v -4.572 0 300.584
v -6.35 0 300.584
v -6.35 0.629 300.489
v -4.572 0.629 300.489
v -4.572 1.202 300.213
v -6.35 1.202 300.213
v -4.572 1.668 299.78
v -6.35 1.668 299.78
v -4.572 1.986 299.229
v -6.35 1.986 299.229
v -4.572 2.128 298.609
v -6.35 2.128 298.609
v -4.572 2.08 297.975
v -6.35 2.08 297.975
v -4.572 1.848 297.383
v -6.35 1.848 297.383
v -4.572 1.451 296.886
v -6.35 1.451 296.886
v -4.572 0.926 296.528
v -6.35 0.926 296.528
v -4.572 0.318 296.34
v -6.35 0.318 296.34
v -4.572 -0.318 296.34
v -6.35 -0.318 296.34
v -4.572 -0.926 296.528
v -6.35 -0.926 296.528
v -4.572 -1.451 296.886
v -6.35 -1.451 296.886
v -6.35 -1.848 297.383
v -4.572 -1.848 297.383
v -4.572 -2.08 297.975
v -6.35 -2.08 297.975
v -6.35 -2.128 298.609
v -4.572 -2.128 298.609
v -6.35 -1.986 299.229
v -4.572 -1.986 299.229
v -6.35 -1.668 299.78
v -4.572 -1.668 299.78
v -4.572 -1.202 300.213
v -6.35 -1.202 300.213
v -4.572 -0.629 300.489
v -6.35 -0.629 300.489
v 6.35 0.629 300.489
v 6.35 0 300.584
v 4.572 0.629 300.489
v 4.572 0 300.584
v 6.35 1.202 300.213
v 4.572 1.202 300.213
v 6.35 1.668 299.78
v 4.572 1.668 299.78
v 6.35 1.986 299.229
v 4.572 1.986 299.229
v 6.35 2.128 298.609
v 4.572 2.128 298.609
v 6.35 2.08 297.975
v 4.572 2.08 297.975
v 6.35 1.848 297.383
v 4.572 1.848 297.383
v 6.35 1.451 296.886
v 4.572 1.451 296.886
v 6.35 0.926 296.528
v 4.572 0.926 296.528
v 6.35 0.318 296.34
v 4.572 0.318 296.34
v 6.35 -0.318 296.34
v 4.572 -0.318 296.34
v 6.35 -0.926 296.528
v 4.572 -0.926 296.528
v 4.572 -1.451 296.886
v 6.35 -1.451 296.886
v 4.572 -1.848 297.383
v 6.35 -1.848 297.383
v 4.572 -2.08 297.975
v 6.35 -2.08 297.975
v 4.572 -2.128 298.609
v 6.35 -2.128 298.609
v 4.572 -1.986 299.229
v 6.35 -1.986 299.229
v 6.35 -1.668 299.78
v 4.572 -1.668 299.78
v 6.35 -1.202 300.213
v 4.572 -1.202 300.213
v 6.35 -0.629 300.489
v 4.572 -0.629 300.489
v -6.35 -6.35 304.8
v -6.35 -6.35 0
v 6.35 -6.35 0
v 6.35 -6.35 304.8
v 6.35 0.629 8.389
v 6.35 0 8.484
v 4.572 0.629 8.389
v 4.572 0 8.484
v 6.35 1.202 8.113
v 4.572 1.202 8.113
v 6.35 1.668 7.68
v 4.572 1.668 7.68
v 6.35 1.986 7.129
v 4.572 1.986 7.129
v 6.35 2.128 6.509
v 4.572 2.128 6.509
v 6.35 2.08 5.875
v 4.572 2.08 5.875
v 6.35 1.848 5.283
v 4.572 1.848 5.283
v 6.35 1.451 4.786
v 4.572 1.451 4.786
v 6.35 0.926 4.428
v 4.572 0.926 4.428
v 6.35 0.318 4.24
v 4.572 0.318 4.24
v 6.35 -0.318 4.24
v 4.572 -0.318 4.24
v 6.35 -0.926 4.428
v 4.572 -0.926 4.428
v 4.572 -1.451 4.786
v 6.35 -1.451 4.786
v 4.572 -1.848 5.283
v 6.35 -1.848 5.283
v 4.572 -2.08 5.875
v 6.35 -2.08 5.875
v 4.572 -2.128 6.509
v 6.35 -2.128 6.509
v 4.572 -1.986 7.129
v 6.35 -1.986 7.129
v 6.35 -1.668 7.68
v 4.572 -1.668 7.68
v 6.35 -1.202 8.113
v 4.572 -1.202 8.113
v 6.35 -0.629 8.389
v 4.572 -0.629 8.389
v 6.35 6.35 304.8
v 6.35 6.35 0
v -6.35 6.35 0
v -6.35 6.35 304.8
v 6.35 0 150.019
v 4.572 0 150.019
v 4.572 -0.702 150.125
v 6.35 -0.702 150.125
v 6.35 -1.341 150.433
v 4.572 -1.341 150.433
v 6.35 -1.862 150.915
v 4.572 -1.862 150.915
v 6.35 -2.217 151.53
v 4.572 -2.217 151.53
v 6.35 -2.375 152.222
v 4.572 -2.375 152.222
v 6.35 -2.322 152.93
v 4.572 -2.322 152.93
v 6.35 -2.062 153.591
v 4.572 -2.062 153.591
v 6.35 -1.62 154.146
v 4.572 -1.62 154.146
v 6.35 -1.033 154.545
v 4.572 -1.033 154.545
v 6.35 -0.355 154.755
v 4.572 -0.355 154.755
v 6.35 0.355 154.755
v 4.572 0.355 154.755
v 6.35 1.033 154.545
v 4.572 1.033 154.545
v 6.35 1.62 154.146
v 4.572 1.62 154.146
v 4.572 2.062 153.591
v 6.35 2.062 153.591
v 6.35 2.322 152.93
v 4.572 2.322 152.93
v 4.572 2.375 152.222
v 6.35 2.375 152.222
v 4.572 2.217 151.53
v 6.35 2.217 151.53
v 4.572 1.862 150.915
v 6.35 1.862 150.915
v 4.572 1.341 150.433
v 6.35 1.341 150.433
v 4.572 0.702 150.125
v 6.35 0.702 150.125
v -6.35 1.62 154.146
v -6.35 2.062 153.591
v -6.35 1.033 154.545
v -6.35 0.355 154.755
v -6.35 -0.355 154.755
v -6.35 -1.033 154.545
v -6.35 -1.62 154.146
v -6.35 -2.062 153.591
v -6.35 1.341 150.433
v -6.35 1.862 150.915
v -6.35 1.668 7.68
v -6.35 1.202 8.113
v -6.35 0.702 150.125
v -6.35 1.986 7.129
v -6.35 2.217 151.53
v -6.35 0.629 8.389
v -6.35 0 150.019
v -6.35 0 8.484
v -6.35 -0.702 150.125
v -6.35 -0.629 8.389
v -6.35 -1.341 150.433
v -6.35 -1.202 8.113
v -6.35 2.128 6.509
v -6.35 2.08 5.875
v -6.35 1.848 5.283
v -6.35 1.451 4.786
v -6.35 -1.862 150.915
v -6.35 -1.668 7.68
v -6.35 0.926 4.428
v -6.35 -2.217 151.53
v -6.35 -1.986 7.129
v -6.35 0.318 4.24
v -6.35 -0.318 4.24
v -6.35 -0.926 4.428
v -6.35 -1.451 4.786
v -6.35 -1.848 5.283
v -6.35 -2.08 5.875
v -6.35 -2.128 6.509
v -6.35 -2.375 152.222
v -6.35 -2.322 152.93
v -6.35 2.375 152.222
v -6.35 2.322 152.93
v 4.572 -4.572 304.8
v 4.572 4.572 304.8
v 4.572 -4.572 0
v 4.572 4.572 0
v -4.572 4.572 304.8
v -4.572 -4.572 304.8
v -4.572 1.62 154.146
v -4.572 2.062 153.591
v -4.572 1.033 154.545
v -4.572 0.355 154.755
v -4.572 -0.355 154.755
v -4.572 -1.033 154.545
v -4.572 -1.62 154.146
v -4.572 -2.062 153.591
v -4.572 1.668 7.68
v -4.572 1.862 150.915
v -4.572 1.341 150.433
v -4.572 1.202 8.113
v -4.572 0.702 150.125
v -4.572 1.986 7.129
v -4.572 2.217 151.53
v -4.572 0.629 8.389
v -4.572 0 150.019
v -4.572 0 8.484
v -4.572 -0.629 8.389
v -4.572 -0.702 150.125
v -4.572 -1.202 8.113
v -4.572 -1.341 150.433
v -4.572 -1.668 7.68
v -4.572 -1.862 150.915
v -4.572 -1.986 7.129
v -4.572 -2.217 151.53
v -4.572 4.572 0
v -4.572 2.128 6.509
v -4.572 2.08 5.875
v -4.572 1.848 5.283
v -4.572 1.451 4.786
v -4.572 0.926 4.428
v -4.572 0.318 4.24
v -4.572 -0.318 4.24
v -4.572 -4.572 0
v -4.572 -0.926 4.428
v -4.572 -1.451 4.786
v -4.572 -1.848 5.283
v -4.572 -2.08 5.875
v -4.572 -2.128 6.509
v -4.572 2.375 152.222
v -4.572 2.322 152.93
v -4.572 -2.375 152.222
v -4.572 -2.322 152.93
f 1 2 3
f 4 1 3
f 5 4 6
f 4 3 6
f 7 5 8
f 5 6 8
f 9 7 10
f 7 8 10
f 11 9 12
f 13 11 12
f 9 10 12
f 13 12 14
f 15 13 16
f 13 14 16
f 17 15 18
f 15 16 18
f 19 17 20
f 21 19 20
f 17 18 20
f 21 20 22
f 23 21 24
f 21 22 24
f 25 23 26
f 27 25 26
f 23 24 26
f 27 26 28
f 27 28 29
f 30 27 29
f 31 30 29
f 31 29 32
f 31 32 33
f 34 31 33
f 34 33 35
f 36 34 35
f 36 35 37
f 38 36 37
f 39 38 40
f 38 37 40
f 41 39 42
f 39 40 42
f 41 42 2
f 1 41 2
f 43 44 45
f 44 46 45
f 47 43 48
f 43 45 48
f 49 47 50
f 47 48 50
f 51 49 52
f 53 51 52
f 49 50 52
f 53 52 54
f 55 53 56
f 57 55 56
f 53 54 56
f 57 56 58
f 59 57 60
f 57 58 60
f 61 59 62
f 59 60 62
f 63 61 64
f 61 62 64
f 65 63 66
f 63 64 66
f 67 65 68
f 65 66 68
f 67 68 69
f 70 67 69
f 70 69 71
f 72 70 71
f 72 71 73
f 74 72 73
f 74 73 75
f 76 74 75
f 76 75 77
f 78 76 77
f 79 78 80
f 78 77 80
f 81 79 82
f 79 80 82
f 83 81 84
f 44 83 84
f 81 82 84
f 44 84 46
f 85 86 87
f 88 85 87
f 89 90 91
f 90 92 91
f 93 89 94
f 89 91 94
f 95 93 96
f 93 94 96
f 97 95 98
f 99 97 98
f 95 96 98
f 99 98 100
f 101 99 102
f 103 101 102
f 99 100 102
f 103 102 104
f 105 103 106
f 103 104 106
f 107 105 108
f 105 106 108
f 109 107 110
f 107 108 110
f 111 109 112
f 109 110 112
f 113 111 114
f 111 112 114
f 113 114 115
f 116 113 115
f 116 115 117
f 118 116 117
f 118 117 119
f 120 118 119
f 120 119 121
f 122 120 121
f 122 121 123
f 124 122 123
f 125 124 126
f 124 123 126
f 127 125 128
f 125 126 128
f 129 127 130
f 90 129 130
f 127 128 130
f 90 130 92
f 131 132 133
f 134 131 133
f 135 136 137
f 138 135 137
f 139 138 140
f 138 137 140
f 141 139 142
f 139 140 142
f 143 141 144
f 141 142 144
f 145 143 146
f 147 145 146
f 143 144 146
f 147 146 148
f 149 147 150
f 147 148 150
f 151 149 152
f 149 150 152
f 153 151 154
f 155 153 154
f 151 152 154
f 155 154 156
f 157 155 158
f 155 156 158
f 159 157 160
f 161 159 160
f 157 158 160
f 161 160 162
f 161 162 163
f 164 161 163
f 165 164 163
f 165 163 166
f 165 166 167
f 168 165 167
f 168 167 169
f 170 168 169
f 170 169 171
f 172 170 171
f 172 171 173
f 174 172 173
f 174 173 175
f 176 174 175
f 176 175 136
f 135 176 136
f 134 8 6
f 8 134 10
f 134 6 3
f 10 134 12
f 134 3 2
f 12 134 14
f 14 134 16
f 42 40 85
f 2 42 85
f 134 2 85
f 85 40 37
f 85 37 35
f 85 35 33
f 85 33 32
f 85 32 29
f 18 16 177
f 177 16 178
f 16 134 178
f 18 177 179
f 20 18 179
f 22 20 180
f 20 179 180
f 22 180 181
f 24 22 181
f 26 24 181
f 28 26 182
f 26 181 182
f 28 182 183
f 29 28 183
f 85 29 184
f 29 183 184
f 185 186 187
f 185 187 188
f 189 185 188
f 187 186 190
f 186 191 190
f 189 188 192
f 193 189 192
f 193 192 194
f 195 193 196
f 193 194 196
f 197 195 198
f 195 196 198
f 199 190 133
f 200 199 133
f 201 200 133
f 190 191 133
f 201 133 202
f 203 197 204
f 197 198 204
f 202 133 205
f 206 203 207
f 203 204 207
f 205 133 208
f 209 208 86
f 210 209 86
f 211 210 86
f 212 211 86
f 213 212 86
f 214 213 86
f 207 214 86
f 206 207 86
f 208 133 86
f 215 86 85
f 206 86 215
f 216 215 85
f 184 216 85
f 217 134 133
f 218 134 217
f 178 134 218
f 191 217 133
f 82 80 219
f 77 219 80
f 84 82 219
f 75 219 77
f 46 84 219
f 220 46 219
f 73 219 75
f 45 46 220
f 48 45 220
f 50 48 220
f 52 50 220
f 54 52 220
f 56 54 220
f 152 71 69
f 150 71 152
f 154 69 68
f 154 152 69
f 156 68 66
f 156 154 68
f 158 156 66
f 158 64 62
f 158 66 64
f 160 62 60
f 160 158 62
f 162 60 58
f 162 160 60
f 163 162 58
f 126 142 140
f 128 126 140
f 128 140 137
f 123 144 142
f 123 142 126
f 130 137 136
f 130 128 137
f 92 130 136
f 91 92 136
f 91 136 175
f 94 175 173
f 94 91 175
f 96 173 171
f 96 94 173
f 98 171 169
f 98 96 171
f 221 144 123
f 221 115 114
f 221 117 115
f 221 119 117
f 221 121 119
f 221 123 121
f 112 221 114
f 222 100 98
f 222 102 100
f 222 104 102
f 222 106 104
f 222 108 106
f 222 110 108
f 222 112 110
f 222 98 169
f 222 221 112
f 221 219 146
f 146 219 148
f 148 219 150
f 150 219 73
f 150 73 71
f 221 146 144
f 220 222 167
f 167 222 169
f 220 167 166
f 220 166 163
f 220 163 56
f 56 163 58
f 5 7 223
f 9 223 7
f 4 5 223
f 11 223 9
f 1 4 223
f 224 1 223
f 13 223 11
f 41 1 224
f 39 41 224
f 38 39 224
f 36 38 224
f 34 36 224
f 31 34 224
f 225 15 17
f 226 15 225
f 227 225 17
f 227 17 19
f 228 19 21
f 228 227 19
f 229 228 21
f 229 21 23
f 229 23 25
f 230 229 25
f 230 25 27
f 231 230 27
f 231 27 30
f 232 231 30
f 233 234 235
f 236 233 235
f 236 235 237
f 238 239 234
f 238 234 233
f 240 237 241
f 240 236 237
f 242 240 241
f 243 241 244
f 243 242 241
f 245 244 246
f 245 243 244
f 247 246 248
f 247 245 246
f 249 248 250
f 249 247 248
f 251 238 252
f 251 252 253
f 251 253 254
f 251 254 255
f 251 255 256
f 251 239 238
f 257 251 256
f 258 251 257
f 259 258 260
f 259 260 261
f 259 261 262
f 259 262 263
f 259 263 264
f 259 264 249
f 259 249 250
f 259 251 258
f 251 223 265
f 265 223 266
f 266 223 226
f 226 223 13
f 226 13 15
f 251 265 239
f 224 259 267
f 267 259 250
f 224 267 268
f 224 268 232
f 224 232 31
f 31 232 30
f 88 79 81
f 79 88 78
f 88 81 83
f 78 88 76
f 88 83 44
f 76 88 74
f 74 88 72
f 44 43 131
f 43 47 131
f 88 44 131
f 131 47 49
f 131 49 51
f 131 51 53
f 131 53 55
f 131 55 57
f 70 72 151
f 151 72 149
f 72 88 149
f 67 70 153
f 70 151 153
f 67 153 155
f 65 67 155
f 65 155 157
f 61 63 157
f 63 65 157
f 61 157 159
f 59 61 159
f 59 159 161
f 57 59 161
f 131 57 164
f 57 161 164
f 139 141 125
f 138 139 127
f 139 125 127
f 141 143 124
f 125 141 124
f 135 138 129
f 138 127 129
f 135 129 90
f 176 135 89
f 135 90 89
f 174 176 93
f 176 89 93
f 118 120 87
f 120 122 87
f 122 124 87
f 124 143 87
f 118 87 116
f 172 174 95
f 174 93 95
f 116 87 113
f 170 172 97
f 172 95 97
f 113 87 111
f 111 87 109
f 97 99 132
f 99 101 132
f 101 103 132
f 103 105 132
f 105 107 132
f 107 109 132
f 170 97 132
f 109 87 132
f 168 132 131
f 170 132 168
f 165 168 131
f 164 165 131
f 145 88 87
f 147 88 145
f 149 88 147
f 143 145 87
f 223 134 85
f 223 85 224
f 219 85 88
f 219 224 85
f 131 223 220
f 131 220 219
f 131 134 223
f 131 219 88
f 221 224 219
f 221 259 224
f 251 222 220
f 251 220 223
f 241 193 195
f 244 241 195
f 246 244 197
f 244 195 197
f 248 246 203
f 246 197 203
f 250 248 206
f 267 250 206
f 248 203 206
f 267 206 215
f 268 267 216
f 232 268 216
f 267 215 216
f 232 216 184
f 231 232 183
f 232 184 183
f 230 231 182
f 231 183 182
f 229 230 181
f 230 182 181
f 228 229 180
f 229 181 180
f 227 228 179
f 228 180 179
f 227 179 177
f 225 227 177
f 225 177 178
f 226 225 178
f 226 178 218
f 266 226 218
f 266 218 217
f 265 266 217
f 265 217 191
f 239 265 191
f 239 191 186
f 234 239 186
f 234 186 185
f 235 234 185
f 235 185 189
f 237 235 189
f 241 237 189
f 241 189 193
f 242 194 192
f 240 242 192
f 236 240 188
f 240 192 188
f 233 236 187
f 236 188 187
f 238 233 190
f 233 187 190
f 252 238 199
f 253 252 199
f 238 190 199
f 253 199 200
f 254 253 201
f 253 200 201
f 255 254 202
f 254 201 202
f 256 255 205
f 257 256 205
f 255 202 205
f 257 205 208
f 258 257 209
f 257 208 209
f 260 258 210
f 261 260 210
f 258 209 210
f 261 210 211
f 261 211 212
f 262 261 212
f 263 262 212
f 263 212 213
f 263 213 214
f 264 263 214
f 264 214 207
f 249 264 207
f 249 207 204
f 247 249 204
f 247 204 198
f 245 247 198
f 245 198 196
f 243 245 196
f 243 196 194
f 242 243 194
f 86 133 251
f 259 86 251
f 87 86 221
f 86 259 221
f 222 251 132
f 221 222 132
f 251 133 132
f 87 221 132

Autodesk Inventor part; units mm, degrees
ref_plane "YZ Plane" through (0, 0, 0) normal (1, 0, 0) x (0, 1, 0)
ref_plane "XZ Plane" through (0, 0, 0) normal (0, 1, 0) x (-1, 0, 0)
ref_plane "XY Plane" through (0, 0, 0) normal (0, 0, 1) x (1, 0, 0)
sketch "Sketch1" plane through (0, 0, 0) normal (0, 0, 1) x (1, 0, 0)
  line L0 (-6.35, -6.35) -> (6.35, -6.35)
  line L1 (6.35, -6.35) -> (6.35, 6.35)
  line L2 (6.35, 6.35) -> (-6.35, 6.35)
  line L3 (-6.35, 6.35) -> (-6.35, -6.35)
  line L4 (-6.35, -6.35) -> (6.35, 6.35) construction
  line L5 (6.35, -6.35) -> (-6.35, 6.35) construction
  line L6 (-4.572, -4.572) -> (4.572, -4.572)
  line L7 (4.572, -4.572) -> (4.572, 4.572)
  line L8 (4.572, 4.572) -> (-4.572, 4.572)
  line L9 (-4.572, 4.572) -> (-4.572, -4.572)
  line L10 (-4.572, -4.572) -> (4.572, 4.572) construction
  line L11 (4.572, -4.572) -> (-4.572, 4.572) construction
  point P0 (0, 0)
  dimension "d0" = 12.7
  dimension "d1" = 12.7
  dimension "d5" = 1.778
extrude "Extrusion1" add sketch "Sketch1" along normal blind 304.8
sketch "Sketch3" plane through (6.35, 6.35, 304.8) normal (1, 0, 0) x (0, 0, -1)
  point P0 (304.8, -6.35)
  point P1 (152.4, -6.35)
hole "Hole1" at (6.35, 0, 152.4) direction (-1, 0, 0) diameter 4.7625 depth 25.4 tip angle 118
sketch "Sketch4" plane through (-6.35, -6.35, 0) normal (-1, 0, 0) x (0, 0, 1)
  line L0 (0, 12.7) -> (0, 0) projected
  line L1 (304.8, 12.7) -> (304.8, 0) projected
  circle A0 centre (298.45, 6.35) radius 2.1336
  circle A1 centre (6.35, 6.35) radius 2.1336
  point P0 (0, 6.35)
  dimension "d13" = 4.2672
  dimension "d14" = 6.35
  dimension "d15" = 4.2672
  dimension "d16" = 6.35
extrude "Extrusion2" cut sketch "Sketch4" against normal blind 12.7
properties part number "5x5mm Box Aluminum" material "Aluminum 6061"
